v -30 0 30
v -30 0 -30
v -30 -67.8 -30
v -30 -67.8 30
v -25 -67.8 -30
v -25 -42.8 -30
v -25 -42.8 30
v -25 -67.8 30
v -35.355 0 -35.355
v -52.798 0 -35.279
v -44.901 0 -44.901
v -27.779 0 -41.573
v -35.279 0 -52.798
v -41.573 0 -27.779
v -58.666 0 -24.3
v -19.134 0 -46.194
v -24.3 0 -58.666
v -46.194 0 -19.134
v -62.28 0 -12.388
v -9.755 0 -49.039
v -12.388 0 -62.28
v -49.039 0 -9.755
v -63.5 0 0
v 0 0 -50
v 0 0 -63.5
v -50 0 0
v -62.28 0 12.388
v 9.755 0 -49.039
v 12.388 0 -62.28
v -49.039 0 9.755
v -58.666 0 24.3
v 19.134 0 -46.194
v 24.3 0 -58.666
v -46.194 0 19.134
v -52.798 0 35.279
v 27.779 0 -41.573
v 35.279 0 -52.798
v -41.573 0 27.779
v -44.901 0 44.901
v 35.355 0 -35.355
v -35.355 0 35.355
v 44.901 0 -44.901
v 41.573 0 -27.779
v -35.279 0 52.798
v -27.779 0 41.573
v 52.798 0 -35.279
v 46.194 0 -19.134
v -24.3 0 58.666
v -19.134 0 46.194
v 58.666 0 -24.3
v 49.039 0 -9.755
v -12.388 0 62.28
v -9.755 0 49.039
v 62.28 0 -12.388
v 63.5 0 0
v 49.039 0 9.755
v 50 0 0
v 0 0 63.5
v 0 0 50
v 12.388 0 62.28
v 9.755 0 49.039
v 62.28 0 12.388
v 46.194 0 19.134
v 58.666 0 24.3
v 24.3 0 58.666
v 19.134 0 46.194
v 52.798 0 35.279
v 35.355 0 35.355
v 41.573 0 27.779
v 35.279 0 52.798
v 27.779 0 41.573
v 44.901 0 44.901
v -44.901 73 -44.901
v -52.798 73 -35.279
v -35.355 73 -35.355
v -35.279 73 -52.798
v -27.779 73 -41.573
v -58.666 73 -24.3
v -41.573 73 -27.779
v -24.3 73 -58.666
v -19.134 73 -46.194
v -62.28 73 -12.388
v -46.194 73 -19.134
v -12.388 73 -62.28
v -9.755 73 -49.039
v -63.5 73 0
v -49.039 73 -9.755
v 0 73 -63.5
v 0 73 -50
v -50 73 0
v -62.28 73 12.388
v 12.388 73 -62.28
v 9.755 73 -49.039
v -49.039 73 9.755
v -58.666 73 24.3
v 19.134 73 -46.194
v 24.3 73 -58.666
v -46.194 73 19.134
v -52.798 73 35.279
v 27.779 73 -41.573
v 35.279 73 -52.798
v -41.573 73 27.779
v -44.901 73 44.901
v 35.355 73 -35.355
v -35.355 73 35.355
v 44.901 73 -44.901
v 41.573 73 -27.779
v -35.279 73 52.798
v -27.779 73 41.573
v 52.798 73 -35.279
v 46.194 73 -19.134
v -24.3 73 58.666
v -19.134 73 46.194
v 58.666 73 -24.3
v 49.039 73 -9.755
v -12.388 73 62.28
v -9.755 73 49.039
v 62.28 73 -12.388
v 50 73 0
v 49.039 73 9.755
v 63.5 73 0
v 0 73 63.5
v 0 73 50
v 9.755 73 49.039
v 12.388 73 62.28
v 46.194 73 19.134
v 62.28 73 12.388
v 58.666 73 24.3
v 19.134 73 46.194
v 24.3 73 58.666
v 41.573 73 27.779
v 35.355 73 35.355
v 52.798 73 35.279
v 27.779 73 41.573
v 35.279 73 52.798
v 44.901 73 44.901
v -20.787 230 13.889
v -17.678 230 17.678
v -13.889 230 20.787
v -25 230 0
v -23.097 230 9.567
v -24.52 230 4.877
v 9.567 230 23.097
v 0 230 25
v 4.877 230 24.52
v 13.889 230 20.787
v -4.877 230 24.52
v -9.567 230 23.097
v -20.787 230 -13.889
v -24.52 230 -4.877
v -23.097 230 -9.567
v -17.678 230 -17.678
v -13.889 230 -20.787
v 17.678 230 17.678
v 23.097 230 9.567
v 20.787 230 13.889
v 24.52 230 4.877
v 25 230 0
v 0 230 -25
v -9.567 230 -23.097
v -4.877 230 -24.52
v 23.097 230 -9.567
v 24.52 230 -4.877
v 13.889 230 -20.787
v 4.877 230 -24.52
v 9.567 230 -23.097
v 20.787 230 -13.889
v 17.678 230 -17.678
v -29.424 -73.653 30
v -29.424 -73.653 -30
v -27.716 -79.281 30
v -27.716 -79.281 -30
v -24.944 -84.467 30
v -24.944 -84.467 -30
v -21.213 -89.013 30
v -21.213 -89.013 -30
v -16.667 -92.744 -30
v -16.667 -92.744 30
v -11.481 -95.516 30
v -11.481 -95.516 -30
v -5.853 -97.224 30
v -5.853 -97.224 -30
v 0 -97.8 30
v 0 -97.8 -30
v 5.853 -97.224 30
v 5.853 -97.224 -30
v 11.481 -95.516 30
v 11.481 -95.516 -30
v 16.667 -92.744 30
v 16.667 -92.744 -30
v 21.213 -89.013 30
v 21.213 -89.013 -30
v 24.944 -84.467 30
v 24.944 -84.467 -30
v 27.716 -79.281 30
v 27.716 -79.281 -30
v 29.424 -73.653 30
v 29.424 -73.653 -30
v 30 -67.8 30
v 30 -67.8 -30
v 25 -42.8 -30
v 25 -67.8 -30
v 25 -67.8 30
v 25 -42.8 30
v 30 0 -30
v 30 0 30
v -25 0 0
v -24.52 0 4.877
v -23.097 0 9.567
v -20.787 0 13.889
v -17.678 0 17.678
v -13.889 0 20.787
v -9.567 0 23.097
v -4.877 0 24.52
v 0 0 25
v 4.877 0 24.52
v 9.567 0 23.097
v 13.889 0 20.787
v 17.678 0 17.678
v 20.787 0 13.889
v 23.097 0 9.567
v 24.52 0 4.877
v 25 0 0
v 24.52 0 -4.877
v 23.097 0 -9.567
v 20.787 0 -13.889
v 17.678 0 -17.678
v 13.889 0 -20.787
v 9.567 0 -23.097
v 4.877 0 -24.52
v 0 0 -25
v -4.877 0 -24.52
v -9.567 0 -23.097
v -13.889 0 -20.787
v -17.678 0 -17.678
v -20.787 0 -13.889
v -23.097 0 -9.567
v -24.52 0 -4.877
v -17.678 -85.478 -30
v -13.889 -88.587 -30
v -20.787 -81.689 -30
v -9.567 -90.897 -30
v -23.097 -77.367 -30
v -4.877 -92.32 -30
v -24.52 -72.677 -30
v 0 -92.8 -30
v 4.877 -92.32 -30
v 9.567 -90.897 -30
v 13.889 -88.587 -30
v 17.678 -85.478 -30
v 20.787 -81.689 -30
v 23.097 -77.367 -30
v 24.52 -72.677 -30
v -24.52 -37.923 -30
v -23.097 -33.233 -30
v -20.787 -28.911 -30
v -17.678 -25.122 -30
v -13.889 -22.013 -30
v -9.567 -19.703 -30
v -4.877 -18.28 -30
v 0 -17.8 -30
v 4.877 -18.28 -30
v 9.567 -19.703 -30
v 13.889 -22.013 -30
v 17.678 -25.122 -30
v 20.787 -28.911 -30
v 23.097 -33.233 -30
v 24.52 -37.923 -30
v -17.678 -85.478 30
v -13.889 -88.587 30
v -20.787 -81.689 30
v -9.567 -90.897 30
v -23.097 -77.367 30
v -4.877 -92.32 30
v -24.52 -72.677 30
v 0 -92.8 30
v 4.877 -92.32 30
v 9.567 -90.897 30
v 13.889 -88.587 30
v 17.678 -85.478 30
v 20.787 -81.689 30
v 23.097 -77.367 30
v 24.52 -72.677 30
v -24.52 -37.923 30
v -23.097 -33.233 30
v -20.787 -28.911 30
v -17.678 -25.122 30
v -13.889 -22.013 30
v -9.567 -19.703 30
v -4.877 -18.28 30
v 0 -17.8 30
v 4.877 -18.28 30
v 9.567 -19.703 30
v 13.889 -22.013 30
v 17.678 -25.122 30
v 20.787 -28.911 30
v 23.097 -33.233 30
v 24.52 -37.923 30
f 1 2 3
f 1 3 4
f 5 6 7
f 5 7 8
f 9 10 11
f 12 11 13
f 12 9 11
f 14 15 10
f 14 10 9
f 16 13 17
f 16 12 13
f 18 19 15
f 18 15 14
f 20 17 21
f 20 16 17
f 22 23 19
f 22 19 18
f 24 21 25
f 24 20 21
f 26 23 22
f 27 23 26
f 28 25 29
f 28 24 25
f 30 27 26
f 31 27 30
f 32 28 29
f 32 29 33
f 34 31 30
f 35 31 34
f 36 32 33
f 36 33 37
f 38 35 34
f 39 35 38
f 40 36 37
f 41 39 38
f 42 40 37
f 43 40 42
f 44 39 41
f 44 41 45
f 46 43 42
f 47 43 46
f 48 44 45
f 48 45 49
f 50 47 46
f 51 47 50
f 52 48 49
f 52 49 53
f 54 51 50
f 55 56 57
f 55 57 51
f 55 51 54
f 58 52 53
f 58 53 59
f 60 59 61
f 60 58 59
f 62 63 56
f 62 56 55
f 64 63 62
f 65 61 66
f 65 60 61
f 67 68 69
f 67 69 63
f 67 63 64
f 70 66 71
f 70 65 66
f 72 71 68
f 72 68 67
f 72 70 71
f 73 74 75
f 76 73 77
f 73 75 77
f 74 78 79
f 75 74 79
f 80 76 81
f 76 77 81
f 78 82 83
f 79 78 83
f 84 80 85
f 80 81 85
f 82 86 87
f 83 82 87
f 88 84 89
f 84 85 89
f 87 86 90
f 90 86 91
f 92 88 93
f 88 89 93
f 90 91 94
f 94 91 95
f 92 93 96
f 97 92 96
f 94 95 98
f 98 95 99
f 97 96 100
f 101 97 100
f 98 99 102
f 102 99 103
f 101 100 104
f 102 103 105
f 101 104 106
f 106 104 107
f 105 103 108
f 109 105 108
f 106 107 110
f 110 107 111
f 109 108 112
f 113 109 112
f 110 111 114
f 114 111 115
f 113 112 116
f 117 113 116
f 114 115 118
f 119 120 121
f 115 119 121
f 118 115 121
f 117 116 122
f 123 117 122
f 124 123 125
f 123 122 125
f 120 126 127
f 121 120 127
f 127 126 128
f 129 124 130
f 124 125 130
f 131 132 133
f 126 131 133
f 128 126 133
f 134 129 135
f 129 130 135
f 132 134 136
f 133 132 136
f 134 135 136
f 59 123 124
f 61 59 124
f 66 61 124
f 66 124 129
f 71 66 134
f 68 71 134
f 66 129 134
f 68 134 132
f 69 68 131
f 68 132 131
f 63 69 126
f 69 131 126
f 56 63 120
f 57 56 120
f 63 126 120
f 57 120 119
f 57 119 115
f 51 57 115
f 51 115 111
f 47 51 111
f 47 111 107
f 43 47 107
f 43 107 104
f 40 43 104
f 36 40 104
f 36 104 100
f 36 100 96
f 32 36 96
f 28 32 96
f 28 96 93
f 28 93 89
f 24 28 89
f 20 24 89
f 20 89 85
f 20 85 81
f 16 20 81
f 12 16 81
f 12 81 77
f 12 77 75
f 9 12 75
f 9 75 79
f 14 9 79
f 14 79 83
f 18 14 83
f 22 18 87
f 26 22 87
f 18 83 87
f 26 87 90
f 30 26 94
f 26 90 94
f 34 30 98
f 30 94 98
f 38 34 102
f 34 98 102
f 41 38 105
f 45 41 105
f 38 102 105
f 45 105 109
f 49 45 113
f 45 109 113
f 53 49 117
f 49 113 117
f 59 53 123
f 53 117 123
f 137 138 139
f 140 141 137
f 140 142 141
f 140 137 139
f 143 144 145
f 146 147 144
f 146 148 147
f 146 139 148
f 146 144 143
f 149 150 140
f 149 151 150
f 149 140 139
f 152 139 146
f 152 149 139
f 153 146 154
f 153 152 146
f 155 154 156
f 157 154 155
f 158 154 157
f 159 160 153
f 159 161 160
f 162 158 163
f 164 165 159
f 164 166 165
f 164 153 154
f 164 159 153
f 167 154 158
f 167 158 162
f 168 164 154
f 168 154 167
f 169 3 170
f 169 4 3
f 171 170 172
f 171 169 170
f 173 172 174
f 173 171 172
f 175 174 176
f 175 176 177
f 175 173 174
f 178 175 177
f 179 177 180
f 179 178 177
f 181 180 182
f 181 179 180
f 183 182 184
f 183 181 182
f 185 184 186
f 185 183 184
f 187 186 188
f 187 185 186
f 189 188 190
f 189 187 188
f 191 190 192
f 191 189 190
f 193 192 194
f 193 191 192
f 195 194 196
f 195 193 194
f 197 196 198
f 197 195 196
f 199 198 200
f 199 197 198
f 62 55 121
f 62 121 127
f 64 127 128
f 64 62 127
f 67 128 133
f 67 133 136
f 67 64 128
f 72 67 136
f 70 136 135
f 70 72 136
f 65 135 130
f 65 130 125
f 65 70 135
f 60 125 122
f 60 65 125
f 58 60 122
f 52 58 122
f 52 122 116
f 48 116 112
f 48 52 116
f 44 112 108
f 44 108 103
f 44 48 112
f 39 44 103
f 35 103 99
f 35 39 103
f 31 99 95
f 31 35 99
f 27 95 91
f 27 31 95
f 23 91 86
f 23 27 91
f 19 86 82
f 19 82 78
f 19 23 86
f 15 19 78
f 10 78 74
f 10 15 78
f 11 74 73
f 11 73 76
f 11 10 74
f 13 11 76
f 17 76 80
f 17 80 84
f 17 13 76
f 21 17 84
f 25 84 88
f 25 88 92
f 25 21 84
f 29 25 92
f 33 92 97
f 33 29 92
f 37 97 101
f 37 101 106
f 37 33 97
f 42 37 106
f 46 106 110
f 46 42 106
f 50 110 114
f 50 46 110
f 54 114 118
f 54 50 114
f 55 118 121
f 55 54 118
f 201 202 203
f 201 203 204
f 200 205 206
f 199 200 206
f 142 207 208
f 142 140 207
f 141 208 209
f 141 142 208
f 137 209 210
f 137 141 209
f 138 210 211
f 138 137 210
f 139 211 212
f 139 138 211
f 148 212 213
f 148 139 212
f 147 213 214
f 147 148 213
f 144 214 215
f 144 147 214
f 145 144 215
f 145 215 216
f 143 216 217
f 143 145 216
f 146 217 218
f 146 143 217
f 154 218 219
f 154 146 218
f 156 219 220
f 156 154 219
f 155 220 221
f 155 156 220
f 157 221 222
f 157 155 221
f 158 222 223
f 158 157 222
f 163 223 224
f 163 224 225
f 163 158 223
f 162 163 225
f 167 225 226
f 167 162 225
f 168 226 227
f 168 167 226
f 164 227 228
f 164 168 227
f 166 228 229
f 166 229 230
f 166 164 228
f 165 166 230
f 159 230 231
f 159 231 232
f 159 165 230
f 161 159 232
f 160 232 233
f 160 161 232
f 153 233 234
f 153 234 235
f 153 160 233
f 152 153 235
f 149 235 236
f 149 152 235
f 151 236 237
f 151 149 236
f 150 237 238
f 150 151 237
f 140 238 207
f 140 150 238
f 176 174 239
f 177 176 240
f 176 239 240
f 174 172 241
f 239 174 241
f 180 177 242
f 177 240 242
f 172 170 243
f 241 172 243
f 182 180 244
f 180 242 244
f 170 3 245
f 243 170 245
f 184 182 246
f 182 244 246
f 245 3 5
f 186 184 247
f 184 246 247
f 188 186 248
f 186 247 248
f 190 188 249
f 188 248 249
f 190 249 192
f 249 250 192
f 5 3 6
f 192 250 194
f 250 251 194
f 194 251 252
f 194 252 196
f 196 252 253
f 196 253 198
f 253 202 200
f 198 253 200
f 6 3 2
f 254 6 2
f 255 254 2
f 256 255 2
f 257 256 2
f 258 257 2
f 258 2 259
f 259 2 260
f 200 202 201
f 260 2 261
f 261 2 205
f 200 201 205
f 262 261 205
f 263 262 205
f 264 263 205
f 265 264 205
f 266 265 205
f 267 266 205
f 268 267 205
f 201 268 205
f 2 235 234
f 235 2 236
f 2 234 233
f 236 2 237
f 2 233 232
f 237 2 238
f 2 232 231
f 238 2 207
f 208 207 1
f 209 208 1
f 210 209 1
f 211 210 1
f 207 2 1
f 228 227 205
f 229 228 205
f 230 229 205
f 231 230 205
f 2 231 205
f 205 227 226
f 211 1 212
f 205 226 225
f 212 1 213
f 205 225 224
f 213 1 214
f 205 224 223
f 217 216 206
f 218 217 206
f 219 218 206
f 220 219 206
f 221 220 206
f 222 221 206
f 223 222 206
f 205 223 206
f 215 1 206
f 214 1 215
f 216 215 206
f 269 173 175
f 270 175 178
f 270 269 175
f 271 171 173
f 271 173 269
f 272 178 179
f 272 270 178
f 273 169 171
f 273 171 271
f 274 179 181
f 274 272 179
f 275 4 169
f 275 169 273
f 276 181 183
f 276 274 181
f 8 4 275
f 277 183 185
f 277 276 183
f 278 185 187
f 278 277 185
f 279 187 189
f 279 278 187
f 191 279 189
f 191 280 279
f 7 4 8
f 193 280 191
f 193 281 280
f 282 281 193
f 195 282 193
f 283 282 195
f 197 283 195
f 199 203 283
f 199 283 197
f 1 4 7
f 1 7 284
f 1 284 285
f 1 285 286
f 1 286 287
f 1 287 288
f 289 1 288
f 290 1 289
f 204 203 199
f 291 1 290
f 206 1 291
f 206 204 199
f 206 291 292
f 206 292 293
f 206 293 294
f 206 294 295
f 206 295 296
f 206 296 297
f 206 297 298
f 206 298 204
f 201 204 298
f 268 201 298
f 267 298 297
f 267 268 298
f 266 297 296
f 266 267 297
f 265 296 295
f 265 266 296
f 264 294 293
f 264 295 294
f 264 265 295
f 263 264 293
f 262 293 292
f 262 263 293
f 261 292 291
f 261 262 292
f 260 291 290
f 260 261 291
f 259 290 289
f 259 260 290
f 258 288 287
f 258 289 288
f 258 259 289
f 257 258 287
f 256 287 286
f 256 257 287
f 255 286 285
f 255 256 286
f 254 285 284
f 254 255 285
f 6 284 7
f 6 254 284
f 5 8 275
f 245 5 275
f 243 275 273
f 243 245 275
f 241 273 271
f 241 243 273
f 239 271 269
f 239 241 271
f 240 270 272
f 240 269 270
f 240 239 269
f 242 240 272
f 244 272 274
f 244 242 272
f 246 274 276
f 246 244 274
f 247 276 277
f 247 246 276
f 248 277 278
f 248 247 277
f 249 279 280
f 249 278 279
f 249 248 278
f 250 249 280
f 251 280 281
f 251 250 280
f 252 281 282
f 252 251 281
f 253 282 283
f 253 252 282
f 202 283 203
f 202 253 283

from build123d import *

# Parameters (mm, degrees)
SKETCH2_W               = 25
SKETCH2_H               = 230
SKETCH13_R              = 63.5
BOSS_EXTRUDE5_DEPTH     = 73
SKETCH16_R              = 50
SKETCH16_R_2            = 25
CUT_EXTRUDE7_DEPTH      = 230
SKETCH17_W              = 60
SKETCH17_H              = 60
BOSS_EXTRUDE7_DEPTH     = 97.8
CUT_EXTRUDE8_DEPTH      = 97.8
CUT_EXTRUDE8_DEPTH_BACK = 97.8
FILLET15_RADIUS         = 30
FILLET15_LENGTH         = 60


with BuildPart() as part:
    # Sketch2 → Revolve2 (revolve)
    with BuildSketch(Plane.XY, mode=Mode.PRIVATE) as revolve2_sk:
        with Locations((12.5, 115)):
            Rectangle(SKETCH2_W, SKETCH2_H)
    revolve(revolve2_sk.sketch.rotate(Axis((0, 230, 0), (0, -1, 0)), 180), axis=Axis((0, 230, 0), (0, -1, 0)))

    # Sketch13 → Boss-Extrude5 (add)
    with BuildSketch(Plane.XZ):
        Circle(SKETCH13_R)
    extrude(amount=-BOSS_EXTRUDE5_DEPTH)

    # Sketch16 → Cut-Extrude7 (cut)
    with BuildSketch(Plane(origin=(0, 230, 0), x_dir=(1, 0, 0), z_dir=(0, 1, 0))):
        with Locations(Location((0, 0, 0), (0, 0, 270))):
            Circle(SKETCH16_R)
        with Locations(Location((0, 0, 0), (0, 0, 180))):
            Circle(SKETCH16_R_2, mode=Mode.SUBTRACT)
    extrude(amount=-CUT_EXTRUDE7_DEPTH, mode=Mode.SUBTRACT)


with BuildPart() as cut_extrude7_piece_1:
    # of the separate pieces the step leaves, piece 1, a body of its own (cut_extrude7_pieces)
    add(part.part.solids().sort_by_distance((-25, 0, 0))[0])

    # Sketch17 → Boss-Extrude7 (add)
    with BuildSketch(Plane.XZ):
        Rectangle(SKETCH17_W, SKETCH17_H)
    extrude(amount=BOSS_EXTRUDE7_DEPTH)

    # Sketch18 → Cut-Extrude8 (cut, two sides: drawn at the far end of the back side and taken through both)
    with BuildSketch(Plane.XY.offset(-CUT_EXTRUDE8_DEPTH_BACK)):
        with BuildLine():
            Line((-25, -42.8), (-25, -67.8))
            ThreePointArc((-25, -67.8), (0, -92.8), (25, -67.8))
            Line((25, -67.8), (25, -42.8))
            ThreePointArc((25, -42.8), (0, -17.8), (-25, -42.8))
        make_face()
    extrude(amount=CUT_EXTRUDE8_DEPTH + CUT_EXTRUDE8_DEPTH_BACK, mode=Mode.SUBTRACT)

    # Fillet15: full round fillet: the end face becomes a half cylinder, R = half its width
    fillet15_face = Plane((0, -97.8, 0), x_dir=(0, 0, 1), z_dir=(0, -1, 0))  # on the end face: x along it, z out of the body
    fillet15_slab = fillet15_face.offset(-FILLET15_RADIUS / 2) * Box(FILLET15_LENGTH, 2 * FILLET15_RADIUS, FILLET15_RADIUS, mode=Mode.PRIVATE)  # the body's end, R deep
    fillet15_round = Plane((0, -67.8, 0), x_dir=(0, -1, 0), z_dir=(0, 0, 1)) * Cylinder(FILLET15_RADIUS, FILLET15_LENGTH, mode=Mode.PRIVATE)  # its axis R under the face
    add(fillet15_slab - fillet15_round, mode=Mode.SUBTRACT)


with BuildPart() as cut_extrude7_piece_2:
    # of the separate pieces the step leaves, piece 2, a body of its own (cut_extrude7_pieces)
    add(part.part.solids().sort_by_distance((63.5, 0, 0))[0])


solid = Compound([cut_extrude7_piece_1.part, cut_extrude7_piece_2.part])
